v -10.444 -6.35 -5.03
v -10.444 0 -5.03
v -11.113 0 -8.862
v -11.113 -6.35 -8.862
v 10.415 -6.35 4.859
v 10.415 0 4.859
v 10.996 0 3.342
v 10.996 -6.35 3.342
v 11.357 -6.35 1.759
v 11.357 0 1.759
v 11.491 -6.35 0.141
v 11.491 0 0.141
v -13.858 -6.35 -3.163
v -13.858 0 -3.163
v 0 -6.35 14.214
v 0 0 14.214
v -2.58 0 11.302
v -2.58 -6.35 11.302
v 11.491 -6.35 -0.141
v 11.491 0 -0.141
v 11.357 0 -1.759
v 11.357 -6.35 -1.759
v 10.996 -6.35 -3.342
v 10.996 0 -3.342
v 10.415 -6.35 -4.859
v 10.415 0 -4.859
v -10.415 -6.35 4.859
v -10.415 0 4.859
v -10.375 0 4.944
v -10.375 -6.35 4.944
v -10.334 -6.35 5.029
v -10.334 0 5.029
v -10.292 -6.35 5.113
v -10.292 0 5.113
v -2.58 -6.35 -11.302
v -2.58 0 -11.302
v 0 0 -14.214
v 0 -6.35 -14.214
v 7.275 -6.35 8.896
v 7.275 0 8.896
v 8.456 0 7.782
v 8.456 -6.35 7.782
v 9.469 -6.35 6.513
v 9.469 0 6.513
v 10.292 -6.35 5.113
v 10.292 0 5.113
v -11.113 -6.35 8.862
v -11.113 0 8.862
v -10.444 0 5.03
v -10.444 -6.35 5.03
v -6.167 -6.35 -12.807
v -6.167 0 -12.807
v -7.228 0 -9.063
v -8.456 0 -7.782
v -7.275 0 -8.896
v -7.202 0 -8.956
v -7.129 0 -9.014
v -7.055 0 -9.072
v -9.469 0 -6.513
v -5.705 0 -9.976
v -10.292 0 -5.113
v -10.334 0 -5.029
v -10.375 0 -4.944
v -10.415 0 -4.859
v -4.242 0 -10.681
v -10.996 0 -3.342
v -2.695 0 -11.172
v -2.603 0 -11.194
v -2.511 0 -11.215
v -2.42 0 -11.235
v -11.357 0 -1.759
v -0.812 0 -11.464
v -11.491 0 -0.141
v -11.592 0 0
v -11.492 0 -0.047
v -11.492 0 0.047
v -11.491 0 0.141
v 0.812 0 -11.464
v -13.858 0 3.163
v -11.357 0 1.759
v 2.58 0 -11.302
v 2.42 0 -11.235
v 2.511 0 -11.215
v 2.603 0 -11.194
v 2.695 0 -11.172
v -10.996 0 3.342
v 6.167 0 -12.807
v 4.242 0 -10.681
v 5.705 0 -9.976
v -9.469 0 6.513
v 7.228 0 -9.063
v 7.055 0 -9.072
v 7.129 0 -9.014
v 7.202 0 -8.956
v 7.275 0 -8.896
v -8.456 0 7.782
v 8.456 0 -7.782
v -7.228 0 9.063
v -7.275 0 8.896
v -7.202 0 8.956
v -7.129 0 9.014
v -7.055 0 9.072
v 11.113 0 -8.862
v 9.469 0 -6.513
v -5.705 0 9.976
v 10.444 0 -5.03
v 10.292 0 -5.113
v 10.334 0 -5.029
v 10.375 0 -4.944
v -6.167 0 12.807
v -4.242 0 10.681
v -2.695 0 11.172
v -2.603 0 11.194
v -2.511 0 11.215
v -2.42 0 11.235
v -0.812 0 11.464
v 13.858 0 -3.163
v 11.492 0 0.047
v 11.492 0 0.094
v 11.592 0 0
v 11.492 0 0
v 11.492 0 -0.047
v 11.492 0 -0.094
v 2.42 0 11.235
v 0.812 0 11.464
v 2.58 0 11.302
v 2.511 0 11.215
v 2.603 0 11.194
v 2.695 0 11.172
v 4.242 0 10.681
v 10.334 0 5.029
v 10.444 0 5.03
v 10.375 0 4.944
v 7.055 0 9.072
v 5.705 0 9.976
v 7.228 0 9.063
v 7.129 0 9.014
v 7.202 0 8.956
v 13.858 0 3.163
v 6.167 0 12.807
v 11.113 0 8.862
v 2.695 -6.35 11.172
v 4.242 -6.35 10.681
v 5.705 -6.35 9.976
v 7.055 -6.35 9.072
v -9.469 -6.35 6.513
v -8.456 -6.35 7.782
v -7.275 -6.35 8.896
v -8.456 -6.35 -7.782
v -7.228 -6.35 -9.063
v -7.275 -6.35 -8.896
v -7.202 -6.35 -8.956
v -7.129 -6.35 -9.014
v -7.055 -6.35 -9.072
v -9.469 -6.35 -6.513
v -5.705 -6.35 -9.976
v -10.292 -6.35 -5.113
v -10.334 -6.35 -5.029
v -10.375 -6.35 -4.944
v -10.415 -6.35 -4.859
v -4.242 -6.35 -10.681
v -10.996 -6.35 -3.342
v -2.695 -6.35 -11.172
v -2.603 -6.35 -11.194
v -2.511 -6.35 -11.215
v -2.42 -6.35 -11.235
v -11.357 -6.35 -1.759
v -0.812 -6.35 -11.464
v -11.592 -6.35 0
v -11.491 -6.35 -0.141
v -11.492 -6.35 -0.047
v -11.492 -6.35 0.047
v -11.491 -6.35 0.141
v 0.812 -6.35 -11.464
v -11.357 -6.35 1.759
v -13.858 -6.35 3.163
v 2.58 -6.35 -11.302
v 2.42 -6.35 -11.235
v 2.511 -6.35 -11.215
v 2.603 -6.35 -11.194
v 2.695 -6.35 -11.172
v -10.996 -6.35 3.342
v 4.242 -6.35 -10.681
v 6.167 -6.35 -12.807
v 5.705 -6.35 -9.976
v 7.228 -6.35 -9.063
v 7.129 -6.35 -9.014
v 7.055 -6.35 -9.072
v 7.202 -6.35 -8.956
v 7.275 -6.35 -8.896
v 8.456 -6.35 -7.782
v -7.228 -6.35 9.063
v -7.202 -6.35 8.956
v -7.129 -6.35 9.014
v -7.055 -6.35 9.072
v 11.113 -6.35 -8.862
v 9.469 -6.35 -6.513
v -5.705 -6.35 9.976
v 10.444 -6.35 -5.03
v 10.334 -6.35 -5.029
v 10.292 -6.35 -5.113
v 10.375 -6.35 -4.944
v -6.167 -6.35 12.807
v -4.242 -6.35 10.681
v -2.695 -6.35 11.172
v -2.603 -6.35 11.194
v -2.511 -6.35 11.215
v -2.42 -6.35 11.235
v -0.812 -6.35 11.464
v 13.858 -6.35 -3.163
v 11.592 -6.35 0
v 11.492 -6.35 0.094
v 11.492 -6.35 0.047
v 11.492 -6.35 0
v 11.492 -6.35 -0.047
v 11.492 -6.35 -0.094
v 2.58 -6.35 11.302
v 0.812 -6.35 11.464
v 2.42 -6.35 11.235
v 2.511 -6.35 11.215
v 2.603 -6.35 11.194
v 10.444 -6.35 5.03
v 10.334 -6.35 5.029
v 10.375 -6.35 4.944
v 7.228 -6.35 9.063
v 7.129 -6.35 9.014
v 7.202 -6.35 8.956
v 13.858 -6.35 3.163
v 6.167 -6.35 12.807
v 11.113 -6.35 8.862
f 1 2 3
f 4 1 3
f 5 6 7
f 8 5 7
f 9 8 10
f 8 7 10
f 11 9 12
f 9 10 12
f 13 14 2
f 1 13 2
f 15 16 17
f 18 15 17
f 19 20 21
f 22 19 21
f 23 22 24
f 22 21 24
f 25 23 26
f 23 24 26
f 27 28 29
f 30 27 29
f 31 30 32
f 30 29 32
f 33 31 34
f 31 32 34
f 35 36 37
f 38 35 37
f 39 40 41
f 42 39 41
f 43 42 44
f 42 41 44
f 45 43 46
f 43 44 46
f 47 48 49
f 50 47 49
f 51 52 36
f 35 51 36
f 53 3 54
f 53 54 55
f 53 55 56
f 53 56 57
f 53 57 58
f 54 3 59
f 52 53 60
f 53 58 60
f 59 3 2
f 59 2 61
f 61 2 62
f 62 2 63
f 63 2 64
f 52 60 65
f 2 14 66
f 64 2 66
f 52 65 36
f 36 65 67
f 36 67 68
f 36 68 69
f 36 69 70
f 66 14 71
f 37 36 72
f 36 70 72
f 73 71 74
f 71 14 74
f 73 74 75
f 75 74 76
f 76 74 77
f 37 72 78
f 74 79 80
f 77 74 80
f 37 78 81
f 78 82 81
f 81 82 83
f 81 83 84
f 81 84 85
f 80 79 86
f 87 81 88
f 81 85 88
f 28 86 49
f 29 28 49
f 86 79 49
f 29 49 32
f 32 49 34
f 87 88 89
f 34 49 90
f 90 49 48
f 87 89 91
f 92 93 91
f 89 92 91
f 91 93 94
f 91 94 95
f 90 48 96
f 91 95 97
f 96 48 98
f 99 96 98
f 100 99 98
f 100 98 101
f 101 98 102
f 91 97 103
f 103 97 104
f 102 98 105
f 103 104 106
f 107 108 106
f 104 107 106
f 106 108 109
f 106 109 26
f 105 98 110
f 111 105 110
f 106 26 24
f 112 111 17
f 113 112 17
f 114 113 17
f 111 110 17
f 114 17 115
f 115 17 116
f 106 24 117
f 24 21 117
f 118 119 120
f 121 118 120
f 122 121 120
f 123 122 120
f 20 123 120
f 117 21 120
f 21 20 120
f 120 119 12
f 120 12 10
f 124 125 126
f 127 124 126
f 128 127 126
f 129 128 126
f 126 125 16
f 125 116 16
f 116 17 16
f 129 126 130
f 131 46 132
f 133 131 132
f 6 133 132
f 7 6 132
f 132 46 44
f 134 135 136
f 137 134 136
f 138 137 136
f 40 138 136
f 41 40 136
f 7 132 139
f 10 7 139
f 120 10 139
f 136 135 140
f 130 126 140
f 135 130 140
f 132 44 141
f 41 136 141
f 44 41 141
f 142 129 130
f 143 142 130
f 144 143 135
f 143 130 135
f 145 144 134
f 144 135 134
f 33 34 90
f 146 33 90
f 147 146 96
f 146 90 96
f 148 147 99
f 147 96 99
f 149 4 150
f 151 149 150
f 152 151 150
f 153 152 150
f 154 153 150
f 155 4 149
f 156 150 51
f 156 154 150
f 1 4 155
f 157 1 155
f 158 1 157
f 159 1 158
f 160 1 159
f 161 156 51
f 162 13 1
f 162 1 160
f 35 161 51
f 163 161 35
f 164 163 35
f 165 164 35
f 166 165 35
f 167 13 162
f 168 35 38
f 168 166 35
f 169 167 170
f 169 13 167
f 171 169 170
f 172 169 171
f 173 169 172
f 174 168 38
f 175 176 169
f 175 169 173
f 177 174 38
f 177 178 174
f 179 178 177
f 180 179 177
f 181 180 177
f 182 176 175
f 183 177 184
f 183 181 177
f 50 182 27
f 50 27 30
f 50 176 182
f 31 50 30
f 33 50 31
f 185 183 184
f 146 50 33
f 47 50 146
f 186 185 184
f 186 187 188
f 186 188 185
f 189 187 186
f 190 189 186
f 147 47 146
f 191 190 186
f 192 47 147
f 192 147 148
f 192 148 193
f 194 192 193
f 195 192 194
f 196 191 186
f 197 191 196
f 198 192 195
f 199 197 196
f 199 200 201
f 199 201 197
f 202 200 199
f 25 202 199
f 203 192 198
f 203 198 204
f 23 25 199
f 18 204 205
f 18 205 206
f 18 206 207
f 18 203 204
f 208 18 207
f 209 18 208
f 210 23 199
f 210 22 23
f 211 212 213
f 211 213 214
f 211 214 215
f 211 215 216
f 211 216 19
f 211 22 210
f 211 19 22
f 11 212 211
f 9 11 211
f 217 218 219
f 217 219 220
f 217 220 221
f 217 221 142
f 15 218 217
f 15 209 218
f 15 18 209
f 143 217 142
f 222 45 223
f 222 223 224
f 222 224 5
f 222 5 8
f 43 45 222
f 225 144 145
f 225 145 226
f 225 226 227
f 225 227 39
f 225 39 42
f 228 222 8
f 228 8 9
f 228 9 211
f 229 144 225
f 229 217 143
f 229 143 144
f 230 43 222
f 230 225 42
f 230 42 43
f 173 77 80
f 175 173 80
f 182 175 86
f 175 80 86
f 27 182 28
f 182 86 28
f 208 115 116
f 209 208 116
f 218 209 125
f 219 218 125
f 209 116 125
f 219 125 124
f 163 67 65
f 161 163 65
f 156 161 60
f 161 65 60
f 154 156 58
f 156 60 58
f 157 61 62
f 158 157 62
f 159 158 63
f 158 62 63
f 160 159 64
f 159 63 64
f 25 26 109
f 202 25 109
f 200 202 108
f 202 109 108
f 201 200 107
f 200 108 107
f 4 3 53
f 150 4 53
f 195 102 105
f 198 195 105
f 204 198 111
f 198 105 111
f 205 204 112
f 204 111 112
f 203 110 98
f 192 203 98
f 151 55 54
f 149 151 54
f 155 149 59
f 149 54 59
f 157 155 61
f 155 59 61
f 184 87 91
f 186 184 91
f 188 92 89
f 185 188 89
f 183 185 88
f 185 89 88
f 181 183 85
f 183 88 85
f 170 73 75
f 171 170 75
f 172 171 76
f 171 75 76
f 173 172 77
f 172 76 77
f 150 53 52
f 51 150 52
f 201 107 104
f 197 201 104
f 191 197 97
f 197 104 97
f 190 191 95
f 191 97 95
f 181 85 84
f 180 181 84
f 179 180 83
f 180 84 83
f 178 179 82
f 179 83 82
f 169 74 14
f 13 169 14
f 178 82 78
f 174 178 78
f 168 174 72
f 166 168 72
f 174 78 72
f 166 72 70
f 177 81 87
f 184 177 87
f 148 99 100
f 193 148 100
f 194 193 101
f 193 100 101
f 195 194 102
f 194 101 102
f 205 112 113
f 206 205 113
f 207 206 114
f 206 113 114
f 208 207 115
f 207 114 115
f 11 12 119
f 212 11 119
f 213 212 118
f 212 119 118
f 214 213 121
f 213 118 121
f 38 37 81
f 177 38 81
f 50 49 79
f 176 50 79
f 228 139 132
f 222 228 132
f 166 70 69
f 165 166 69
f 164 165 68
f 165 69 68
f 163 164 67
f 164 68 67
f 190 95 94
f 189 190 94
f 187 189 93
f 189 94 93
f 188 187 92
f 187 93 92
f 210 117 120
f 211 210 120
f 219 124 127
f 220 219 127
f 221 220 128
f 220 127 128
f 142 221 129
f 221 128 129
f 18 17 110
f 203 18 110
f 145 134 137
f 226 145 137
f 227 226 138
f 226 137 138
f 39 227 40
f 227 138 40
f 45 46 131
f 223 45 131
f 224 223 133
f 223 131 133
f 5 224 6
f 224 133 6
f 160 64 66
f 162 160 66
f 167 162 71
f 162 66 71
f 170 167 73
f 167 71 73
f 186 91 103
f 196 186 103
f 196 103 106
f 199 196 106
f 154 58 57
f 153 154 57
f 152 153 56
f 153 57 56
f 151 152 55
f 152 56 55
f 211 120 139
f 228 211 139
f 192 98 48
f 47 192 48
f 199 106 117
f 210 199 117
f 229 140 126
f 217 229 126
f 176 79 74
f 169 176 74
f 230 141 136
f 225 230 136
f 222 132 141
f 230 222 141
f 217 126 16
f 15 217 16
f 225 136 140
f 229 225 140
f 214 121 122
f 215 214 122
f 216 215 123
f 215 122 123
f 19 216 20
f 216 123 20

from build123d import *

# Parameters (mm, degrees)
F1_DEPTH = 6.35


with BuildPart() as f1:
    # F0 (on Front) → F1 (new body)
    with BuildSketch(Plane.XZ):
        with BuildLine():
            ThreePointArc((11.4914766139, 0.1410518603), (11.4921258391, 0.0705272582), (11.4923422502, 0))
            ThreePointArc((11.4923422502, 0), (11.4921258391, -0.0705272582), (11.4914766139, -0.1410518603))
            Line((11.4914766139, -0.1410518603), (11.5924987112, 0))
            Line((11.5924987112, 0), (11.4914766139, 0.1410518603))
        make_face()
        with BuildLine():
            ThreePointArc((10.4146627839, 4.8588815063), (11.204205236, 2.5572867309), (11.4914766139, 0.1410518603))
            Line((11.4914766139, 0.1410518603), (11.5924987112, 0))
            Line((11.5924987112, 0), (13.8578264949, 3.1629584667))
            Line((13.8578264949, 3.1629584667), (10.44448044, 5.0297966865))
            Line((10.44448044, 5.0297966865), (10.4146627839, 4.8588815063))
        make_face()
        with BuildLine():
            Line((11.5924987112, 0), (11.4914766139, -0.1410518603))
            ThreePointArc((11.4914766139, -0.1410518603), (11.204205236, -2.5572867309), (10.4146627839, -4.8588815063))
            Line((10.4146627839, -4.8588815063), (10.44448044, -5.0297966865))
            Line((10.44448044, -5.0297966865), (13.8578264949, -3.1629584667))
            Line((13.8578264949, -3.1629584667), (11.5924987112, 0))
        make_face()
        with BuildLine():
            ThreePointArc((10.2922625668, 5.1130481761), (10.3542425867, 4.9863404267), (10.4146627839, 4.8588815063))
            Line((10.4146627839, 4.8588815063), (10.44448044, 5.0297966865))
            Line((10.44448044, 5.0297966865), (10.2922625668, 5.1130481761))
        make_face()
        with BuildLine():
            Line((10.44448044, -5.0297966865), (10.4146627839, -4.8588815063))
            ThreePointArc((10.4146627839, -4.8588815063), (10.3542425867, -4.9863404267), (10.2922625668, -5.1130481761))
            Line((10.2922625668, -5.1130481761), (10.44448044, -5.0297966865))
        make_face()
        with BuildLine():
            ThreePointArc((7.2750972621, 8.8964538004), (8.9850749785, 7.1653581925), (10.2922625668, 5.1130481761))
            Line((10.2922625668, 5.1130481761), (10.44448044, 5.0297966865))
            Line((10.44448044, 5.0297966865), (11.1131140025, 8.8624126846))
            Line((11.1131140025, 8.8624126846), (7.2278047245, 9.0633804529))
            Line((7.2278047245, 9.0633804529), (7.2750972621, 8.8964538004))
        make_face()
        with BuildLine():
            Line((10.44448044, -5.0297966865), (10.2922625668, -5.1130481761))
            ThreePointArc((10.2922625668, -5.1130481761), (8.9850749785, -7.1653581925), (7.2750972621, -8.8964538004))
            Line((7.2750972621, -8.8964538004), (7.2278047245, -9.0633804529))
            Line((7.2278047245, -9.0633804529), (11.1131140025, -8.8624126846))
            Line((11.1131140025, -8.8624126846), (10.44448044, -5.0297966865))
        make_face()
        with BuildLine():
            ThreePointArc((7.054539692, 9.0723425932), (7.1653581925, 8.9850749785), (7.2750972621, 8.8964538004))
            Line((7.2750972621, 8.8964538004), (7.2278047245, 9.0633804529))
            Line((7.2278047245, 9.0633804529), (7.054539692, 9.0723425932))
        make_face()
        with BuildLine():
            Line((7.2278047245, -9.0633804529), (7.2750972621, -8.8964538004))
            ThreePointArc((7.2750972621, -8.8964538004), (7.1653581925, -8.9850749785), (7.054539692, -9.0723425932))
            Line((7.054539692, -9.0723425932), (7.2278047245, -9.0633804529))
        make_face()
        with BuildLine():
            ThreePointArc((2.6946095043, 11.1719743114), (4.9863404267, 10.3542425867), (7.054539692, 9.0723425932))
            Line((7.054539692, 9.0723425932), (7.2278047245, 9.0633804529))
            Line((7.2278047245, 9.0633804529), (6.1673129885, 12.80655738))
            Line((6.1673129885, 12.80655738), (2.5795736401, 11.3018505655))
            Line((2.5795736401, 11.3018505655), (2.6946095043, 11.1719743114))
        make_face()
        with BuildLine():
            Line((7.2278047245, -9.0633804529), (7.054539692, -9.0723425932))
            ThreePointArc((7.054539692, -9.0723425932), (4.9863404267, -10.3542425867), (2.6946095043, -11.1719743114))
            Line((2.6946095043, -11.1719743114), (2.5795736401, -11.3018505655))
            Line((2.5795736401, -11.3018505655), (6.1673129885, -12.80655738))
            Line((6.1673129885, -12.80655738), (7.2278047245, -9.0633804529))
        make_face()
        with BuildLine():
            ThreePointArc((2.419578713, 11.2347482948), (2.5572867309, 11.204205236), (2.6946095043, 11.1719743114))
            Line((2.6946095043, 11.1719743114), (2.5795736401, 11.3018505655))
            Line((2.5795736401, 11.3018505655), (2.419578713, 11.2347482948))
        make_face()
        with BuildLine():
            Line((2.5795736401, -11.3018505655), (2.6946095043, -11.1719743114))
            ThreePointArc((2.6946095043, -11.1719743114), (2.5572867309, -11.204205236), (2.419578713, -11.2347482948))
            Line((2.419578713, -11.2347482948), (2.5795736401, -11.3018505655))
        make_face()
        with BuildLine():
            ThreePointArc((-2.419578713, 11.2347482948), (0, 11.4923422502), (2.419578713, 11.2347482948))
            Line((2.419578713, 11.2347482948), (2.5795736401, 11.3018505655))
            Line((2.5795736401, 11.3018505655), (0, 14.2142063241))
            Line((0, 14.2142063241), (-2.5795736401, 11.3018505655))
            Line((-2.5795736401, 11.3018505655), (-2.419578713, 11.2347482948))
        make_face()
        with BuildLine():
            Line((2.5795736401, -11.3018505655), (2.419578713, -11.2347482948))
            ThreePointArc((2.419578713, -11.2347482948), (0, -11.4923422502), (-2.419578713, -11.2347482948))
            Line((-2.419578713, -11.2347482948), (-2.5795736401, -11.3018505655))
            Line((-2.5795736401, -11.3018505655), (0, -14.2142063241))
            Line((0, -14.2142063241), (2.5795736401, -11.3018505655))
        make_face()
        with BuildLine():
            ThreePointArc((-2.6946095043, 11.1719743114), (-2.5572867309, 11.204205236), (-2.419578713, 11.2347482948))
            Line((-2.419578713, 11.2347482948), (-2.5795736401, 11.3018505655))
            Line((-2.5795736401, 11.3018505655), (-2.6946095043, 11.1719743114))
        make_face()
        with BuildLine():
            Line((-2.5795736401, -11.3018505655), (-2.419578713, -11.2347482948))
            ThreePointArc((-2.419578713, -11.2347482948), (-2.5572867309, -11.204205236), (-2.6946095043, -11.1719743114))
            Line((-2.6946095043, -11.1719743114), (-2.5795736401, -11.3018505655))
        make_face()
        with BuildLine():
            ThreePointArc((-7.054539692, 9.0723425932), (-4.9863404267, 10.3542425867), (-2.6946095043, 11.1719743114))
            Line((-2.6946095043, 11.1719743114), (-2.5795736401, 11.3018505655))
            Line((-2.5795736401, 11.3018505655), (-6.1673129885, 12.80655738))
            Line((-6.1673129885, 12.80655738), (-7.2278047245, 9.0633804529))
            Line((-7.2278047245, 9.0633804529), (-7.054539692, 9.0723425932))
        make_face()
        with BuildLine():
            Line((-2.5795736401, -11.3018505655), (-2.6946095043, -11.1719743114))
            ThreePointArc((-2.6946095043, -11.1719743114), (-4.9863404267, -10.3542425867), (-7.054539692, -9.0723425932))
            Line((-7.054539692, -9.0723425932), (-7.2278047245, -9.0633804529))
            Line((-7.2278047245, -9.0633804529), (-6.1673129885, -12.80655738))
            Line((-6.1673129885, -12.80655738), (-2.5795736401, -11.3018505655))
        make_face()
        with BuildLine():
            ThreePointArc((-7.2750972621, 8.8964538004), (-7.1653581925, 8.9850749785), (-7.054539692, 9.0723425932))
            Line((-7.054539692, 9.0723425932), (-7.2278047245, 9.0633804529))
            Line((-7.2278047245, 9.0633804529), (-7.2750972621, 8.8964538004))
        make_face()
        with BuildLine():
            Line((-7.2278047245, -9.0633804529), (-7.054539692, -9.0723425932))
            ThreePointArc((-7.054539692, -9.0723425932), (-7.1653581925, -8.9850749785), (-7.2750972621, -8.8964538004))
            Line((-7.2750972621, -8.8964538004), (-7.2278047245, -9.0633804529))
        make_face()
        with BuildLine():
            ThreePointArc((-10.2922625668, 5.1130481761), (-8.9850749785, 7.1653581925), (-7.2750972621, 8.8964538004))
            Line((-7.2750972621, 8.8964538004), (-7.2278047245, 9.0633804529))
            Line((-7.2278047245, 9.0633804529), (-11.1131140025, 8.8624126846))
            Line((-11.1131140025, 8.8624126846), (-10.44448044, 5.0297966865))
            Line((-10.44448044, 5.0297966865), (-10.2922625668, 5.1130481761))
        make_face()
        with BuildLine():
            Line((-7.2278047245, -9.0633804529), (-7.2750972621, -8.8964538004))
            ThreePointArc((-7.2750972621, -8.8964538004), (-8.9850749785, -7.1653581925), (-10.2922625668, -5.1130481761))
            Line((-10.2922625668, -5.1130481761), (-10.44448044, -5.0297966865))
            Line((-10.44448044, -5.0297966865), (-11.1131140025, -8.8624126846))
            Line((-11.1131140025, -8.8624126846), (-7.2278047245, -9.0633804529))
        make_face()
        with BuildLine():
            ThreePointArc((-10.4146627839, 4.8588815063), (-10.3542425867, 4.9863404267), (-10.2922625668, 5.1130481761))
            Line((-10.2922625668, 5.1130481761), (-10.44448044, 5.0297966865))
            Line((-10.44448044, 5.0297966865), (-10.4146627839, 4.8588815063))
        make_face()
        with BuildLine():
            Line((-10.44448044, -5.0297966865), (-10.2922625668, -5.1130481761))
            ThreePointArc((-10.2922625668, -5.1130481761), (-10.3542425867, -4.9863404267), (-10.4146627839, -4.8588815063))
            Line((-10.4146627839, -4.8588815063), (-10.44448044, -5.0297966865))
        make_face()
        with BuildLine():
            ThreePointArc((-11.4914766139, 0.1410518603), (-11.204205236, 2.5572867309), (-10.4146627839, 4.8588815063))
            Line((-10.4146627839, 4.8588815063), (-10.44448044, 5.0297966865))
            Line((-10.44448044, 5.0297966865), (-13.8578264949, 3.1629584667))
            Line((-13.8578264949, 3.1629584667), (-11.5924987112, 0))
            Line((-11.5924987112, 0), (-11.4914766139, 0.1410518603))
        make_face()
        with BuildLine():
            Line((-10.44448044, -5.0297966865), (-10.4146627839, -4.8588815063))
            ThreePointArc((-10.4146627839, -4.8588815063), (-11.204205236, -2.5572867309), (-11.4914766139, -0.1410518603))
            Line((-11.4914766139, -0.1410518603), (-11.5924987112, 0))
            Line((-11.5924987112, 0), (-13.8578264949, -3.1629584667))
            Line((-13.8578264949, -3.1629584667), (-10.44448044, -5.0297966865))
        make_face()
        with BuildLine():
            ThreePointArc((-11.4914766139, -0.1410518603), (-11.4923422502, 0), (-11.4914766139, 0.1410518603))
            Line((-11.4914766139, 0.1410518603), (-11.5924987112, 0))
            Line((-11.5924987112, 0), (-11.4914766139, -0.1410518603))
        make_face()
    extrude(amount=F1_DEPTH)


solid = f1.part
